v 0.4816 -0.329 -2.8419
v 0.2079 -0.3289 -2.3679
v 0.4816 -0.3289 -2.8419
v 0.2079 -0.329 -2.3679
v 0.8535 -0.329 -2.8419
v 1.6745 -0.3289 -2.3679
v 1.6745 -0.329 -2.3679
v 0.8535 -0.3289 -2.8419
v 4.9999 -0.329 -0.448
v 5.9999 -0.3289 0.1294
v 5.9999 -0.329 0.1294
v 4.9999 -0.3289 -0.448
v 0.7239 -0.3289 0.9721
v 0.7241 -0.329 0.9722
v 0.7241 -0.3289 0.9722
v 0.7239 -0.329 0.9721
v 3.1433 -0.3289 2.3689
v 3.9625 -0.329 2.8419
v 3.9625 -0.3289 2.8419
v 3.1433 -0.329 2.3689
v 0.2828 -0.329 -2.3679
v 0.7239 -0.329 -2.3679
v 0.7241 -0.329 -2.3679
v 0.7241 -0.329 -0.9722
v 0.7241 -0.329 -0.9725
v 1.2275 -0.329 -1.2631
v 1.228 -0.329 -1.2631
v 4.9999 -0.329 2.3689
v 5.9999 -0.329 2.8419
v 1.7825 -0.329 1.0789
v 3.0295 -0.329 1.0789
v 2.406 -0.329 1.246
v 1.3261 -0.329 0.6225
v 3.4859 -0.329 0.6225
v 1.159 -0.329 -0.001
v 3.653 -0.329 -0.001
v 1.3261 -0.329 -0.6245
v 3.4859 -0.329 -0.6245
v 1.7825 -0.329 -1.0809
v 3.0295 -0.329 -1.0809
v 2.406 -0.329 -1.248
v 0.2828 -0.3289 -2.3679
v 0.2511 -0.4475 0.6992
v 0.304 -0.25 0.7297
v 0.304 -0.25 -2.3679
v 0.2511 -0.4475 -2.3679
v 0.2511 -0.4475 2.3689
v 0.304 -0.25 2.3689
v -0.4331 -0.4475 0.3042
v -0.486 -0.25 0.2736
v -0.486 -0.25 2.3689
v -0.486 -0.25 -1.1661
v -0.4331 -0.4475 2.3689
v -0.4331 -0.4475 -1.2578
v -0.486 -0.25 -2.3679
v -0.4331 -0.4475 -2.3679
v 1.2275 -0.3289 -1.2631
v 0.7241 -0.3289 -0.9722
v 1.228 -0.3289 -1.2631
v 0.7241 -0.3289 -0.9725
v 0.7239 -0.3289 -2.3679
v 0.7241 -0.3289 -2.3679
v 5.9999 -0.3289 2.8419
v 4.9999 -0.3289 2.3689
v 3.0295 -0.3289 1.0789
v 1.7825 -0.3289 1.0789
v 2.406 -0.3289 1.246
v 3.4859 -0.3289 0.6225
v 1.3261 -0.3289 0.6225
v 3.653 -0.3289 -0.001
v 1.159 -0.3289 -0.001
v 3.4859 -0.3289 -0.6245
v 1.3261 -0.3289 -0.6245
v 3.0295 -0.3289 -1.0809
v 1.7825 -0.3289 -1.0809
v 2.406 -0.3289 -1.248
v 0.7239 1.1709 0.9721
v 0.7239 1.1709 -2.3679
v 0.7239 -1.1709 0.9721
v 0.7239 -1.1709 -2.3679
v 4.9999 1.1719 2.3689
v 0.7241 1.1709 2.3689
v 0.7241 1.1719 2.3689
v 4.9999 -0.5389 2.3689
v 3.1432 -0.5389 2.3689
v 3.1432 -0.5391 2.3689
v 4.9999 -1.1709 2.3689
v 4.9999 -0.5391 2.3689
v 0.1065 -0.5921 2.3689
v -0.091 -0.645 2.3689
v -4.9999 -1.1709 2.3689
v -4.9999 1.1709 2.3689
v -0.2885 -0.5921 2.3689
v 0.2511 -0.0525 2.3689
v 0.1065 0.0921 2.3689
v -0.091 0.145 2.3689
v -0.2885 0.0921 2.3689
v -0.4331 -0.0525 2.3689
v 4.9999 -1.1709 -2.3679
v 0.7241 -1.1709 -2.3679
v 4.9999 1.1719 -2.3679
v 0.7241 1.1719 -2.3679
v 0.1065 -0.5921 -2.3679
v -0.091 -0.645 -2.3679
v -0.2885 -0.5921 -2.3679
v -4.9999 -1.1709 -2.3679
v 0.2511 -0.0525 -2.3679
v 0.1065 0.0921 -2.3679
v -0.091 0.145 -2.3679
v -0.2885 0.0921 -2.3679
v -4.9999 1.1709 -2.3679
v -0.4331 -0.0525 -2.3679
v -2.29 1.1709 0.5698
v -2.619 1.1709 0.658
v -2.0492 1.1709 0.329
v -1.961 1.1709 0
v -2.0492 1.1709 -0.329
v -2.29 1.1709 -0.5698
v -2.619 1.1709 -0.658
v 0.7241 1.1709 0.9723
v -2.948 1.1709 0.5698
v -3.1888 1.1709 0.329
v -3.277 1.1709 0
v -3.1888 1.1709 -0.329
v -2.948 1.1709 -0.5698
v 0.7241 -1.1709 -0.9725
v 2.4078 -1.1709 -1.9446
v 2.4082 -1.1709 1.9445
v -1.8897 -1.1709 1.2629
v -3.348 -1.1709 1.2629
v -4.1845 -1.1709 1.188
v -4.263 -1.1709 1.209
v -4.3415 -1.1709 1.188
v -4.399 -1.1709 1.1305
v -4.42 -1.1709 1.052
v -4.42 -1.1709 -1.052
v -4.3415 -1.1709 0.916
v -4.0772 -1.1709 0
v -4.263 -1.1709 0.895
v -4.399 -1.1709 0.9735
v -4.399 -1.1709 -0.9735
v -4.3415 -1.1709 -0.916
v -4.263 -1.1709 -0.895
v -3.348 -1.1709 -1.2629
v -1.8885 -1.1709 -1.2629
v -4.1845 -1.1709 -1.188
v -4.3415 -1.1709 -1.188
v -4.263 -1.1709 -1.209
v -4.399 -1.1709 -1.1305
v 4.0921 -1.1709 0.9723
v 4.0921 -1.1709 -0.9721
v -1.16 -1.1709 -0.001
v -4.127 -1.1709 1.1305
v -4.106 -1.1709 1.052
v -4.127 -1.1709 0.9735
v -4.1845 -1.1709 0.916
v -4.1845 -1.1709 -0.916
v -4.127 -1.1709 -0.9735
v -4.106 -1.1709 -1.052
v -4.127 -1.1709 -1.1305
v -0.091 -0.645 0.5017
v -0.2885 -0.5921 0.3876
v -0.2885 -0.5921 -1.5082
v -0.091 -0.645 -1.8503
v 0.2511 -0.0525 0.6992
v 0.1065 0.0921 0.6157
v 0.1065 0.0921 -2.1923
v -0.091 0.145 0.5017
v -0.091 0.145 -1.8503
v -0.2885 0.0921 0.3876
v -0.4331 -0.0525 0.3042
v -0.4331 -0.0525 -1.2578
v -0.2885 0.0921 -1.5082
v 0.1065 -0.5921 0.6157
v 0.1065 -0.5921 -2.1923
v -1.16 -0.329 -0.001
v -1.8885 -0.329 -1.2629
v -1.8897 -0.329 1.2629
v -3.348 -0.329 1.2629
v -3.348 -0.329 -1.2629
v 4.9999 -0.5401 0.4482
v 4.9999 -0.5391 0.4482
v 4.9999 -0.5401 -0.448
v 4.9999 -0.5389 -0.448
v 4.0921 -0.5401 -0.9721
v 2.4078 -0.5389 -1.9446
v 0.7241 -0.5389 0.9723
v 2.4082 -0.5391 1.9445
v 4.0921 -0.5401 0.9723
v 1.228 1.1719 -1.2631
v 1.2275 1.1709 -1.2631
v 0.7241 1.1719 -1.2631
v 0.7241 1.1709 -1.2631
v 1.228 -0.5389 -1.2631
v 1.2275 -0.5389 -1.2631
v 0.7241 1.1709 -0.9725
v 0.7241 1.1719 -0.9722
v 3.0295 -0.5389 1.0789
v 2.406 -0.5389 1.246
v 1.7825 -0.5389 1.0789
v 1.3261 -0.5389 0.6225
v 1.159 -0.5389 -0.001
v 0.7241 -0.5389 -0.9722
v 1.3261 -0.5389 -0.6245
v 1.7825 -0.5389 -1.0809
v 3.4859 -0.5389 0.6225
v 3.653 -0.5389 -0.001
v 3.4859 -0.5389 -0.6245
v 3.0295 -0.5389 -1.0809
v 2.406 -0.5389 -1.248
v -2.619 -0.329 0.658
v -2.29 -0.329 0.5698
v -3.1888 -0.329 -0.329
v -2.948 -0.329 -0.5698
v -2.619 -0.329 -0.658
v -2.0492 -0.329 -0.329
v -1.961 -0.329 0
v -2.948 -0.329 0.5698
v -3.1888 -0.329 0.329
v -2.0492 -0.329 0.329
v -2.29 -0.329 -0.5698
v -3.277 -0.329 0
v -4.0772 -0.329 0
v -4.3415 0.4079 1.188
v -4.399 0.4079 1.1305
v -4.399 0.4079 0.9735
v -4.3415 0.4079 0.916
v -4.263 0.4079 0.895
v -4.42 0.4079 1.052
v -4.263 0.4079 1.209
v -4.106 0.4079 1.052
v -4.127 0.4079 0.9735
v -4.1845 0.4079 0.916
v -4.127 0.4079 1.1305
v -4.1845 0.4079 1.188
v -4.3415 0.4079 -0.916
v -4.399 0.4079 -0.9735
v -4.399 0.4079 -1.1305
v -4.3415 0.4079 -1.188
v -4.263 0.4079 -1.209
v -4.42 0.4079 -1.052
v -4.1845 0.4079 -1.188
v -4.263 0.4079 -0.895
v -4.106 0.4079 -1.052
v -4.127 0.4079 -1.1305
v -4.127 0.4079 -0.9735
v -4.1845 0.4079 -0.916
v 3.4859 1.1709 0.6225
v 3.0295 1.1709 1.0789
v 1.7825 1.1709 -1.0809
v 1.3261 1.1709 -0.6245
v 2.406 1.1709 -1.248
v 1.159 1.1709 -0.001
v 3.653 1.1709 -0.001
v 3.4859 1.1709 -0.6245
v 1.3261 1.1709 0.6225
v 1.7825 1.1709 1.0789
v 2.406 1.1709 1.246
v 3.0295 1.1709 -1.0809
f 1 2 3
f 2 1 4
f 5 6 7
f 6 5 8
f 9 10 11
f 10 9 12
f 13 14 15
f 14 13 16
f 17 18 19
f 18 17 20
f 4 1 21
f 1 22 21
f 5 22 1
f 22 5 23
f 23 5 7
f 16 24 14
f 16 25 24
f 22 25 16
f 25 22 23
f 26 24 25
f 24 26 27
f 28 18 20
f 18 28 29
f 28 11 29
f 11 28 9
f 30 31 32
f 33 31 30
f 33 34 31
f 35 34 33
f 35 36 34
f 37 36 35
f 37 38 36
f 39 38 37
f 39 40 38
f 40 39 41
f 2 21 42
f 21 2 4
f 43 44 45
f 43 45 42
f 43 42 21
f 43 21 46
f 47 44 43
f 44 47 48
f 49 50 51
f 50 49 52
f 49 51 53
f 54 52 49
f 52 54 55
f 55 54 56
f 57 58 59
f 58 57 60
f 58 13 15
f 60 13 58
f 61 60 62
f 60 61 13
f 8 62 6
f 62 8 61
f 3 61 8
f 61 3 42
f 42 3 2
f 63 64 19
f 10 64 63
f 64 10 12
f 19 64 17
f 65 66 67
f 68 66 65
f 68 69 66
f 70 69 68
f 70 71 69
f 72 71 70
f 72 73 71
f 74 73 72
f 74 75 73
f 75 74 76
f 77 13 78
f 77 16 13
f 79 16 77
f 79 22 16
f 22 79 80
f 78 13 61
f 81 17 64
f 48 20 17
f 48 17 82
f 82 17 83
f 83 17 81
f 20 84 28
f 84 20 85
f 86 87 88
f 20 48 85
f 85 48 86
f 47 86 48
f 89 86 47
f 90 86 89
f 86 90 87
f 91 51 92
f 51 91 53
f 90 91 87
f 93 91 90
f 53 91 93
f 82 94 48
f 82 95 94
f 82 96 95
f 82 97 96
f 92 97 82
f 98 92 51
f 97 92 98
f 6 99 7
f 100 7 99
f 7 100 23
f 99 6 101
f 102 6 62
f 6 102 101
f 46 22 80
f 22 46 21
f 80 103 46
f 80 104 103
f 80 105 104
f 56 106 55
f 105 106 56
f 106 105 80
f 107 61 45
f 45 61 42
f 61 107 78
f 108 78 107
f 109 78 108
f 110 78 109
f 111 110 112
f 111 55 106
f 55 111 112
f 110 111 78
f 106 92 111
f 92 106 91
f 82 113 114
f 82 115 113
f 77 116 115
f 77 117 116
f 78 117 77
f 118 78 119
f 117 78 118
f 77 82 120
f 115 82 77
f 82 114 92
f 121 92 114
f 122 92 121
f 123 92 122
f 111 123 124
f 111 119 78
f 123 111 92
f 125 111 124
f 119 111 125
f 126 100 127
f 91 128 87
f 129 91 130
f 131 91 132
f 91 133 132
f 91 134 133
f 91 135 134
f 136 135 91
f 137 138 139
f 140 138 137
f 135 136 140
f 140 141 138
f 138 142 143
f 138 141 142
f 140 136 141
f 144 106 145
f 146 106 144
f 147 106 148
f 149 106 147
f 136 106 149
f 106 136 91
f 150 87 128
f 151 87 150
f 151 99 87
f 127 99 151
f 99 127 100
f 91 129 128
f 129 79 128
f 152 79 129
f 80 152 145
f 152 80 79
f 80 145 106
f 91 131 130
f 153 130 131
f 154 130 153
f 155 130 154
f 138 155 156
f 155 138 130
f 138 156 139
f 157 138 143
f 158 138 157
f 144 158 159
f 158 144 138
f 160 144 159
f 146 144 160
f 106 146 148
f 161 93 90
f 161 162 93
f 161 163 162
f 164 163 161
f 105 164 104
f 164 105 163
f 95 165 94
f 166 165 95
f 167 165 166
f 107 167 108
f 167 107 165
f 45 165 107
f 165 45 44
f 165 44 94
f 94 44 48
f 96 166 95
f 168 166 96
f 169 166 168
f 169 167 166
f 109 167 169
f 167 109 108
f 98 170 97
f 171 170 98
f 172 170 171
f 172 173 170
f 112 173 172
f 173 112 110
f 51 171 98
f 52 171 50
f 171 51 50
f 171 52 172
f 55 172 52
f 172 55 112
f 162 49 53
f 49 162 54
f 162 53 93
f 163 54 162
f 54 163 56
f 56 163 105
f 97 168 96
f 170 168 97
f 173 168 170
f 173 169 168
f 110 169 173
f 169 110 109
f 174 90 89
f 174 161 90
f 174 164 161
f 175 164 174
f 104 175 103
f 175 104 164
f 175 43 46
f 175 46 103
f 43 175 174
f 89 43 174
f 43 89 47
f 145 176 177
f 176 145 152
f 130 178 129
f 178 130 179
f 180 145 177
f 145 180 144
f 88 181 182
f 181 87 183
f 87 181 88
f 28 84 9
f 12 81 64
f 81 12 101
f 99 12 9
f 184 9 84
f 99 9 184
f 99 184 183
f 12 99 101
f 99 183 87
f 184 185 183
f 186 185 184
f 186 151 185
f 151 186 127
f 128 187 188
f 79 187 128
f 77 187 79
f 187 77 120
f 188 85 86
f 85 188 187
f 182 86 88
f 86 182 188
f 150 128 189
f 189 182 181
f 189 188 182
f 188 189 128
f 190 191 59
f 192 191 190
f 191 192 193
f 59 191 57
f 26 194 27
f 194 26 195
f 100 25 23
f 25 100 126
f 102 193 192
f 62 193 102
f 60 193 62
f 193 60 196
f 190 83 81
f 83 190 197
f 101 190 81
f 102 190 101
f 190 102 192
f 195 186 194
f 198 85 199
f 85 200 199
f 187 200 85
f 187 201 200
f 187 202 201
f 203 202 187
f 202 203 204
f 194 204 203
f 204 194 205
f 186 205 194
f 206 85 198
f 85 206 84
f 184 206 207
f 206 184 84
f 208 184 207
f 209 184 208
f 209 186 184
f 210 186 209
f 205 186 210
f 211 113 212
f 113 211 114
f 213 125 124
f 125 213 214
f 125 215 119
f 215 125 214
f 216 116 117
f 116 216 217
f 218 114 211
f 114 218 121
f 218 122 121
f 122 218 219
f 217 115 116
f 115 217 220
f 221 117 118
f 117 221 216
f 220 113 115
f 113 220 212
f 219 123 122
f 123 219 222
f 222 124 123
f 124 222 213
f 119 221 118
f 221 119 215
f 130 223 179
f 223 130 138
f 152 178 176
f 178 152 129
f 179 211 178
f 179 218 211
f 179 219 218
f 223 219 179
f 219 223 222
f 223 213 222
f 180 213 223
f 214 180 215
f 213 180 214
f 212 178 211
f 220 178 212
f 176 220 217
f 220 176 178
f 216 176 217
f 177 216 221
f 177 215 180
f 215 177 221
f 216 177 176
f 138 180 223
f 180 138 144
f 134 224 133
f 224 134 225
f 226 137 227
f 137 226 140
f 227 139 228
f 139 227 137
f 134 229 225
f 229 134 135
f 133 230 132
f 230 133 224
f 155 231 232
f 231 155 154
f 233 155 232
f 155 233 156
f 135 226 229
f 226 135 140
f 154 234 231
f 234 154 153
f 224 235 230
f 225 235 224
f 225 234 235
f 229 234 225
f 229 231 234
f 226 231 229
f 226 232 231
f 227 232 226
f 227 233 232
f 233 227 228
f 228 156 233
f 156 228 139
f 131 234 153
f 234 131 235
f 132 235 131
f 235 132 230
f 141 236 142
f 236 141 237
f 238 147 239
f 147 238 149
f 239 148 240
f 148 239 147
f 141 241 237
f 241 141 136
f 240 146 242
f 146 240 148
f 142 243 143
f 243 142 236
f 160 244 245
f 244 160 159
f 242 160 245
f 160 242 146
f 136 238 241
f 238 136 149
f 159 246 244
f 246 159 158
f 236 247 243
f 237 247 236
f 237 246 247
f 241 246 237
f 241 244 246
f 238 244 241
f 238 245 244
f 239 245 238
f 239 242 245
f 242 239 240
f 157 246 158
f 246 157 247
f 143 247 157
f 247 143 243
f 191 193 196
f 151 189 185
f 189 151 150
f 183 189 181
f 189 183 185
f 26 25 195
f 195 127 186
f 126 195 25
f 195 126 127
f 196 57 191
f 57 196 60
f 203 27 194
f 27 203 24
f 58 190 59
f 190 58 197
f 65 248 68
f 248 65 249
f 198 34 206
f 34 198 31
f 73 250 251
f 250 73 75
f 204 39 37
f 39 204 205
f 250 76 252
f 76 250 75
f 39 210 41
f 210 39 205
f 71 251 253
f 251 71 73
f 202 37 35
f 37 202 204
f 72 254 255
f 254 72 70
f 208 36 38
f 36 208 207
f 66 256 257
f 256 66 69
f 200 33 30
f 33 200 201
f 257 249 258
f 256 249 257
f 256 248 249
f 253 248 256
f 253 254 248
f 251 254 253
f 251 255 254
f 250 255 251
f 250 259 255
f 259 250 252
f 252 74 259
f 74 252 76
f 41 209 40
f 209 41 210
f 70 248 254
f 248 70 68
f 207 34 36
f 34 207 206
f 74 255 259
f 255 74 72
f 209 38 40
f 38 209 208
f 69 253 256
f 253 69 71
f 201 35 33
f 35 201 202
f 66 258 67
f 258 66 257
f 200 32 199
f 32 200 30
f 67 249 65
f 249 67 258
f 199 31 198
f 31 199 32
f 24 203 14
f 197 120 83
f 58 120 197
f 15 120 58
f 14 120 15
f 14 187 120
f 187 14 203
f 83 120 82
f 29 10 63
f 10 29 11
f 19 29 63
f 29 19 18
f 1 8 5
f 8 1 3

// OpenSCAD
intersection() {
  translate([0, 0.0005, 0])
  cube(size = [11.9998, 2.8108, 5.6838], center = true);

  union() {
    difference() {
      difference() {
        translate([8.00479, 0, 3.23131])
        rotate([-90, -30, 0])
        cube(size = [19.1038, 3.3678, 2.3418], center = true);
      
        translate([6.55, -0.75, 0])
        cube(size = [23.0999, 0.8419, 36.1999], center = true);
      }
    
      union() {
        translate([-0.091, -0.25, 7.866])
        cylinder(h = 20.4679, r1 = 0.395, r2 = 0.395, center = true, $fn = 12);
      
        translate([7.40279, 0.421, -4.274])
        rotate([90, 30, 0])
        cube(size = [19.1039, 36.1999, 1.4999], center = true);
      }
    }
  
    difference() {
      difference() {
        translate([-2.138, 0, 0.0005])
        cube(size = [5.7238, 2.3418, 4.7368], center = true);
      
        translate([-0.091, -0.25, 0.0005])
        cylinder(h = 4.7369, r1 = 0.395, r2 = 0.395, center = true, $fn = 12);
      }
    
      intersection() {
        translate([-8.27227, 0, 4.776])
        rotate([90, 30, 0])
        cube(size = [17.0959, 36.1999, 2.3419], center = true);
      
        translate([-8.688, 0, 0])
        cube(size = [18.8239, 2.3419, 2.5259], center = true);
      }
    }
  
    difference() {
      union() {
        difference() {
          translate([0, 0, 0.0005])
          cube(size = [9.9998, 2.3418, 4.7368], center = true);
        
          translate([8.00479, -8.4645, 3.23131])
          rotate([-90, -30, 0])
          cube(size = [19.1039, 3.3679, 19.2709], center = true);
        }
      
        intersection() {
          translate([12.6498, -0.855, 4.81407])
          rotate([90, 30, 0])
          cube(size = [19.1038, 15.2118, 0.6318], center = true);
        
          translate([2.862, -0.855, 0.553])
          cube(size = [4.2758, 0.6318, 3.6318], center = true);
        }
      
        translate([2.862, 0.3165, -1.8155])
        cube(size = [4.2758, 1.7108, 1.1048], center = true);
      }
    
      union() {
        translate([-4.263, -8.846, 1.052])
        rotate([180, 90, -90])
        cylinder(h = 18.5079, r1 = 0.157, r2 = 0.157, center = true, $fn = 12);
      
        intersection() {
          translate([-2.138, 0, -8.4185])
          cube(size = [5.7239, 2.3419, 19.3629], center = true);
        
          translate([-2.619, -8.4645, 1.8795e-15])
          rotate([180, 90, -90])
          cylinder(h = 19.2709, r1 = 0.658, r2 = 0.658, center = true, $fn = 12);
        }
      
        translate([-4.263, -8.846, -1.052])
        rotate([180, 90, -90])
        cylinder(h = 18.5079, r1 = 0.157, r2 = 0.157, center = true, $fn = 12);
      
        intersection() {
          union() {
            translate([2.862, -0.855, 0.0005])
            cube(size = [4.2759, 0.6319, 4.7369], center = true);
          
            translate([6.30856, 8.4645, -3.64225])
            rotate([90, 30, 0])
            cube(size = [21.6309, 36.1999, 19.2709], center = true);
          }
        
          union() {
            translate([-0.091, -0.25, 0])
            cylinder(h = 36.1999, r1 = 0.395, r2 = 0.395, center = true, $fn = 12);
          
            translate([-5.76715, -0.75, 5.45299])
            rotate([-90, -30, 0])
            cube(size = [2.5259, 20.9879, 0.8419], center = true);
          }
        }
      }
    }
  
    intersection() {
      union() {
        translate([2.862, 0, -0.552])
        cube(size = [4.2758, 2.3418, 3.6318], center = true);
      
        translate([-12.9173, -0.3815, 3.26938])
        rotate([-90, -30, 0])
        cube(size = [17.0958, 17.6198, 1.5788], center = true);
      }
    
      union() {
        translate([4.546, -9.32, 8.4185])
        cube(size = [0.9078, 17.5598, 19.3628], center = true);
      
        translate([2.75779, -6.66134e-16, -12.3194])
        rotate([90, 30, 0])
        cube(size = [19.1038, 17.6198, 2.3418], center = true);
      }
    }
  
    intersection() {
      difference() {
        translate([10.7136, 8.4645, 3.98743])
        rotate([90, 30, 0])
        cube(size = [21.6308, 18.5798, 19.2708], center = true);
      
        translate([2.406, 8.88178e-16, -0.001])
        rotate([180, 90, -90])
        cylinder(h = 2.3419, r1 = 1.247, r2 = 1.247, center = true, $fn = 12);
      }
    
      union() {
        translate([2.862, 0.3165, 0.0005])
        cube(size = [4.2758, 1.7108, 4.7368], center = true);
      
        translate([2.75779, -9.6355, 12.3194])
        rotate([-90, -30, 0])
        cube(size = [19.1038, 17.6198, 16.9288], center = true);
      }
    }
  }
}
